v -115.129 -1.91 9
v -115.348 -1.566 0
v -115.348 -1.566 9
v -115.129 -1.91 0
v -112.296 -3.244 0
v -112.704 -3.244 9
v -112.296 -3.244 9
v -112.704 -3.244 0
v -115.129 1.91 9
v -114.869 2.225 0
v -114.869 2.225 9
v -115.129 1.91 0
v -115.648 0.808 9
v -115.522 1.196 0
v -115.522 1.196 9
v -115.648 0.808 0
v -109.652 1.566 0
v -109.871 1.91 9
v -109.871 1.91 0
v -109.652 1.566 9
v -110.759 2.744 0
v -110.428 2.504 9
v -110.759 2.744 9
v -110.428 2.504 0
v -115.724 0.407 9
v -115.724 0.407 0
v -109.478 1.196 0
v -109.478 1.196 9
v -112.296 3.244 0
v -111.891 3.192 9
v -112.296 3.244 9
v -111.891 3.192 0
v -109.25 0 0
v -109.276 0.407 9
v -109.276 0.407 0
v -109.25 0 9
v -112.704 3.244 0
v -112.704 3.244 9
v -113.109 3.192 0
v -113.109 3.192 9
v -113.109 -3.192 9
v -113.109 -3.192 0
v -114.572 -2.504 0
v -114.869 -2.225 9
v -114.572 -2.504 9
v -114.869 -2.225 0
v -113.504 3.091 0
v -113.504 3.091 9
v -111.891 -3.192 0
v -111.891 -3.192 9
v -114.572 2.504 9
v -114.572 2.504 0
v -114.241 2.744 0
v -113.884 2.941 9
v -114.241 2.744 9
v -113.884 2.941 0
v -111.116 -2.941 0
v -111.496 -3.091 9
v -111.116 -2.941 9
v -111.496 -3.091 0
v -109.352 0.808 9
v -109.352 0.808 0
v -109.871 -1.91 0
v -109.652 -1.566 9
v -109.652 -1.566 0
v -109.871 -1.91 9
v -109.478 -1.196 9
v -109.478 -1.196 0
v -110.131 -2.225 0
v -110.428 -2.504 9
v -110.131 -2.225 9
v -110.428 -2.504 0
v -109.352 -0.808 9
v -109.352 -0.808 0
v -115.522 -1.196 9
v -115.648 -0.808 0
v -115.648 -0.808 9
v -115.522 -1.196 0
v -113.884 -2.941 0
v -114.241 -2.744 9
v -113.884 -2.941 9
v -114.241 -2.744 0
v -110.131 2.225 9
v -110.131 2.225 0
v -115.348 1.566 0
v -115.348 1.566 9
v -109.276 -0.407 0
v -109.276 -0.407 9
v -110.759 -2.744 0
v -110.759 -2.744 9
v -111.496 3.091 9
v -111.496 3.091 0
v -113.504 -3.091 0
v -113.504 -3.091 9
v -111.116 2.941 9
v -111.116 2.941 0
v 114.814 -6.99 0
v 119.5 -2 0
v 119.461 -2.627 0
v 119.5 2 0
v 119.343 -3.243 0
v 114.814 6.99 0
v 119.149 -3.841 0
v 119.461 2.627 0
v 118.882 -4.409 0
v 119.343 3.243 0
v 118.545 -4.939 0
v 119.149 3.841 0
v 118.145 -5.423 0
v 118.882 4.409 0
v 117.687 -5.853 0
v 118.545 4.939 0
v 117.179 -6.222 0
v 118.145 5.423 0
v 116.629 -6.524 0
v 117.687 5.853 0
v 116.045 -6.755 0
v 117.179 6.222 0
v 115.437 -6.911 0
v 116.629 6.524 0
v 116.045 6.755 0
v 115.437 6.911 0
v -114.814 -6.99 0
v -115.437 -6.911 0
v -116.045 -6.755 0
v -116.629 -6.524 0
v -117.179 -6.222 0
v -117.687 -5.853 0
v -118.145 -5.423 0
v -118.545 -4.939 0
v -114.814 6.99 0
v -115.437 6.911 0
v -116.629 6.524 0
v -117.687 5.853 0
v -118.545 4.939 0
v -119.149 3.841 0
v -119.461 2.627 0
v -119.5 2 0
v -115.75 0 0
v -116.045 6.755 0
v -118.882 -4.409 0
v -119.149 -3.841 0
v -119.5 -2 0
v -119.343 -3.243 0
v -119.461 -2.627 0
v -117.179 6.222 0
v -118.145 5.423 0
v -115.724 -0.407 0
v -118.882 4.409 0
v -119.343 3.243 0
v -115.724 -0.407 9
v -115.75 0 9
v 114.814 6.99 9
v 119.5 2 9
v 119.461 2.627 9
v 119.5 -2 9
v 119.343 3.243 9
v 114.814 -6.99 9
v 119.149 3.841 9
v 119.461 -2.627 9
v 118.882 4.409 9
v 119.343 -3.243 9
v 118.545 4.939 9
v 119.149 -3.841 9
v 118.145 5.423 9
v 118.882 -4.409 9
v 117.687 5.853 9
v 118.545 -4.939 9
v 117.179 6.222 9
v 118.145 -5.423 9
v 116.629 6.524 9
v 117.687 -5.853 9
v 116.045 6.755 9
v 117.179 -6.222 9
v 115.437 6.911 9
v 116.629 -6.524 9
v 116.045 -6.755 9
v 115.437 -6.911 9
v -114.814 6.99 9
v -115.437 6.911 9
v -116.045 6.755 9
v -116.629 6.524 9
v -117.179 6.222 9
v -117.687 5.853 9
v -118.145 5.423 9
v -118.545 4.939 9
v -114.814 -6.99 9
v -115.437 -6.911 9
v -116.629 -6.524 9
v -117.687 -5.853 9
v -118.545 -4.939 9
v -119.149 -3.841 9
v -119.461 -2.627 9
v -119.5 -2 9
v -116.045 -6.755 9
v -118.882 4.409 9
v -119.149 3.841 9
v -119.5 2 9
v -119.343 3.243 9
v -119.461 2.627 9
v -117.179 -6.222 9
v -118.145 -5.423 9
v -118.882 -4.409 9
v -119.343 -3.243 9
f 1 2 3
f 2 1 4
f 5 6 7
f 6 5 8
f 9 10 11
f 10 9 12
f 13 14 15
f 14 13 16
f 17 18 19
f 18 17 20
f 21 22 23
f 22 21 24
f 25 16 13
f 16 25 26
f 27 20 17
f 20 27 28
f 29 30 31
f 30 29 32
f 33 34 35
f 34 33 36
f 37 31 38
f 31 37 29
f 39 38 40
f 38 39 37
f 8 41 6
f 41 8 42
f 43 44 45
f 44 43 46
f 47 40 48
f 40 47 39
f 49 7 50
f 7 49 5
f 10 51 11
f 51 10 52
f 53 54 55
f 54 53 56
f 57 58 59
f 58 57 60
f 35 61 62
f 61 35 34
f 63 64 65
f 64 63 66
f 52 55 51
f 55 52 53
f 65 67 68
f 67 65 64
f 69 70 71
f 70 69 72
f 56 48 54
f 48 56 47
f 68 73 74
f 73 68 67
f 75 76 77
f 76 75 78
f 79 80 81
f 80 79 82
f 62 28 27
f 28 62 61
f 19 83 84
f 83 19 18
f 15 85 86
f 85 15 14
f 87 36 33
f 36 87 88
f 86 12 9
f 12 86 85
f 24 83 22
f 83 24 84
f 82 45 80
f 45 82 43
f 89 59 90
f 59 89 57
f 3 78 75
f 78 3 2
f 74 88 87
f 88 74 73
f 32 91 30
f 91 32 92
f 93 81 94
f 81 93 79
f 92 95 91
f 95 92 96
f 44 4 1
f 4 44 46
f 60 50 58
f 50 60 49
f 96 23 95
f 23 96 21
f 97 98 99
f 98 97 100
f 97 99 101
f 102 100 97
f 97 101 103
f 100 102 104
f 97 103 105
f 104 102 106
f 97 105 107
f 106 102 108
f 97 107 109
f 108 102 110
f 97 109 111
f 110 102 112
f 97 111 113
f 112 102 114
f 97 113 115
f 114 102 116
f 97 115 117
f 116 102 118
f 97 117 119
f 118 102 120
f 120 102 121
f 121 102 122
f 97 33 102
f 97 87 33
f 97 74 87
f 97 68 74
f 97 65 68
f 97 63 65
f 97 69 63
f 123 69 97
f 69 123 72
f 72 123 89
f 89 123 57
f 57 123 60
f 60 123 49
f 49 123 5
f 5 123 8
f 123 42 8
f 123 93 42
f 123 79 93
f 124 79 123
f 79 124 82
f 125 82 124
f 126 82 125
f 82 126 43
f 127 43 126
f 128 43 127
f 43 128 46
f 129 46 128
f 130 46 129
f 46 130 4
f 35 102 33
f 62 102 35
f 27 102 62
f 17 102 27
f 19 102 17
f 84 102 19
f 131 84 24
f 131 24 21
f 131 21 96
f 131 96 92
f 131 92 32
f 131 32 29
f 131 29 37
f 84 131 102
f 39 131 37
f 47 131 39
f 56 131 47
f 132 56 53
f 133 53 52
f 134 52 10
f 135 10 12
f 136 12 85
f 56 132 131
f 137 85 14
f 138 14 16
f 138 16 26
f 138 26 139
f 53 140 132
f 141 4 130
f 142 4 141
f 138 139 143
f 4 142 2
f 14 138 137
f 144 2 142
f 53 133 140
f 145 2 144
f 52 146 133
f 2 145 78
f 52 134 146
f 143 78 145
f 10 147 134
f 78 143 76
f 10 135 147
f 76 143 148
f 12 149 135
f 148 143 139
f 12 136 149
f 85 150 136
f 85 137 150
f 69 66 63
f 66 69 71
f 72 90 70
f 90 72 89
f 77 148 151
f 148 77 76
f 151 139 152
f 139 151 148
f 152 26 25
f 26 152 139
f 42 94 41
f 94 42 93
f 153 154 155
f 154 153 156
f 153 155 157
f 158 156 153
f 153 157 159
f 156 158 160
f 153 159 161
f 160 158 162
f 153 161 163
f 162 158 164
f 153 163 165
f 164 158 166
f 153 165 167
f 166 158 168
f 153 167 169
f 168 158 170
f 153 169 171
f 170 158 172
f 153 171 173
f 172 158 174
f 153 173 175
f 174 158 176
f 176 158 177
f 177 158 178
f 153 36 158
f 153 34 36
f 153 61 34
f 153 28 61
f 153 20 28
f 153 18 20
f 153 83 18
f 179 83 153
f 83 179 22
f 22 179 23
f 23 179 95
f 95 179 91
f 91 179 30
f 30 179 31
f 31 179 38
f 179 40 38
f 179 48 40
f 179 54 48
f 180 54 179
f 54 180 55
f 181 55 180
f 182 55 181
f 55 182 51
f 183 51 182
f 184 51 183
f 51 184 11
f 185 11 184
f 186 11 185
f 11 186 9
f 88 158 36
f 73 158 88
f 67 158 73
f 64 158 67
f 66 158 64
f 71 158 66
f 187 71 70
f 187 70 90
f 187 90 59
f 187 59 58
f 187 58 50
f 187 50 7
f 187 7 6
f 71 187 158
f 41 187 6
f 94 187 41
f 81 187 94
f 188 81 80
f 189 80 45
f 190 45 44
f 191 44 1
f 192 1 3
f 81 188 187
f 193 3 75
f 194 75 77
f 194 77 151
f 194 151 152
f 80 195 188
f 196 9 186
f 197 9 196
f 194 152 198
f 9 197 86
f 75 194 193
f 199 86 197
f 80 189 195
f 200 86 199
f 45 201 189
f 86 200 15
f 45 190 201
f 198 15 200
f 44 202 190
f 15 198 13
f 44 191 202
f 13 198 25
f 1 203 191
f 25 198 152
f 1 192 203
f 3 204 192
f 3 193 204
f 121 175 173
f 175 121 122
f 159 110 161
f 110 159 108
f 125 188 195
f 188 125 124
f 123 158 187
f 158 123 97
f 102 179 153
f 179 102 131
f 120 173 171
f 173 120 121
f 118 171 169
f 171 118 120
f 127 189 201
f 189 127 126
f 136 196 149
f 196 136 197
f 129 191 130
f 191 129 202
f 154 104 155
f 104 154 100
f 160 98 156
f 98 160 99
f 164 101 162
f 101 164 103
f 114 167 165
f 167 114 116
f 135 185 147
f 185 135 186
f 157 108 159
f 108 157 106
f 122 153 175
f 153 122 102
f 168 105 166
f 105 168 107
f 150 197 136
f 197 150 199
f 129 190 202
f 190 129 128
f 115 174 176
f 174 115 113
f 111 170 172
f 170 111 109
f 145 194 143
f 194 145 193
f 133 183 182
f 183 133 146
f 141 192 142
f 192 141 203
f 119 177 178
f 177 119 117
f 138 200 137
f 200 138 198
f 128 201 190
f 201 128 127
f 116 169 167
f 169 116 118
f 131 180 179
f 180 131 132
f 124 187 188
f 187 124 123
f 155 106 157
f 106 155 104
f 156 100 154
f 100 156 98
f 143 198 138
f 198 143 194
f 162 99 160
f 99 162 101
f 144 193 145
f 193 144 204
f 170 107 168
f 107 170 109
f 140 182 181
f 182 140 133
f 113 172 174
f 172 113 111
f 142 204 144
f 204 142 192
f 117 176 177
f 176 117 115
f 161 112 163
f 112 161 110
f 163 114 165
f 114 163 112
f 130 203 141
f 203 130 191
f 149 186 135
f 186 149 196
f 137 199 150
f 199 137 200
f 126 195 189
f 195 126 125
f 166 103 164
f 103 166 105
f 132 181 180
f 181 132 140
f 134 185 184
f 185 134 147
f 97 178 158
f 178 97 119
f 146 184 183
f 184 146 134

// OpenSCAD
$fn = 50;


difference() {
	union() {
		hull() {
			translate(v = [-114.5000000000, 2.0000000000, 0]) {
				cylinder(h = 9, r = 5);
			}
			translate(v = [114.5000000000, 2.0000000000, 0]) {
				cylinder(h = 9, r = 5);
			}
			translate(v = [-114.5000000000, -2.0000000000, 0]) {
				cylinder(h = 9, r = 5);
			}
			translate(v = [114.5000000000, -2.0000000000, 0]) {
				cylinder(h = 9, r = 5);
			}
		}
	}
	union() {
		translate(v = [-112.5000000000, 0.0000000000, 0]) {
			cylinder(h = 9, r = 3.2500000000);
		}
		translate(v = [-112.5000000000, 0.0000000000, 0]) {
			cylinder(h = 9, r = 1.8000000000);
		}
		translate(v = [-112.5000000000, 0.0000000000, 0]) {
			cylinder(h = 9, r = 1.8000000000);
		}
		translate(v = [-112.5000000000, 0.0000000000, 0]) {
			cylinder(h = 9, r = 1.8000000000);
		}
	}
}
